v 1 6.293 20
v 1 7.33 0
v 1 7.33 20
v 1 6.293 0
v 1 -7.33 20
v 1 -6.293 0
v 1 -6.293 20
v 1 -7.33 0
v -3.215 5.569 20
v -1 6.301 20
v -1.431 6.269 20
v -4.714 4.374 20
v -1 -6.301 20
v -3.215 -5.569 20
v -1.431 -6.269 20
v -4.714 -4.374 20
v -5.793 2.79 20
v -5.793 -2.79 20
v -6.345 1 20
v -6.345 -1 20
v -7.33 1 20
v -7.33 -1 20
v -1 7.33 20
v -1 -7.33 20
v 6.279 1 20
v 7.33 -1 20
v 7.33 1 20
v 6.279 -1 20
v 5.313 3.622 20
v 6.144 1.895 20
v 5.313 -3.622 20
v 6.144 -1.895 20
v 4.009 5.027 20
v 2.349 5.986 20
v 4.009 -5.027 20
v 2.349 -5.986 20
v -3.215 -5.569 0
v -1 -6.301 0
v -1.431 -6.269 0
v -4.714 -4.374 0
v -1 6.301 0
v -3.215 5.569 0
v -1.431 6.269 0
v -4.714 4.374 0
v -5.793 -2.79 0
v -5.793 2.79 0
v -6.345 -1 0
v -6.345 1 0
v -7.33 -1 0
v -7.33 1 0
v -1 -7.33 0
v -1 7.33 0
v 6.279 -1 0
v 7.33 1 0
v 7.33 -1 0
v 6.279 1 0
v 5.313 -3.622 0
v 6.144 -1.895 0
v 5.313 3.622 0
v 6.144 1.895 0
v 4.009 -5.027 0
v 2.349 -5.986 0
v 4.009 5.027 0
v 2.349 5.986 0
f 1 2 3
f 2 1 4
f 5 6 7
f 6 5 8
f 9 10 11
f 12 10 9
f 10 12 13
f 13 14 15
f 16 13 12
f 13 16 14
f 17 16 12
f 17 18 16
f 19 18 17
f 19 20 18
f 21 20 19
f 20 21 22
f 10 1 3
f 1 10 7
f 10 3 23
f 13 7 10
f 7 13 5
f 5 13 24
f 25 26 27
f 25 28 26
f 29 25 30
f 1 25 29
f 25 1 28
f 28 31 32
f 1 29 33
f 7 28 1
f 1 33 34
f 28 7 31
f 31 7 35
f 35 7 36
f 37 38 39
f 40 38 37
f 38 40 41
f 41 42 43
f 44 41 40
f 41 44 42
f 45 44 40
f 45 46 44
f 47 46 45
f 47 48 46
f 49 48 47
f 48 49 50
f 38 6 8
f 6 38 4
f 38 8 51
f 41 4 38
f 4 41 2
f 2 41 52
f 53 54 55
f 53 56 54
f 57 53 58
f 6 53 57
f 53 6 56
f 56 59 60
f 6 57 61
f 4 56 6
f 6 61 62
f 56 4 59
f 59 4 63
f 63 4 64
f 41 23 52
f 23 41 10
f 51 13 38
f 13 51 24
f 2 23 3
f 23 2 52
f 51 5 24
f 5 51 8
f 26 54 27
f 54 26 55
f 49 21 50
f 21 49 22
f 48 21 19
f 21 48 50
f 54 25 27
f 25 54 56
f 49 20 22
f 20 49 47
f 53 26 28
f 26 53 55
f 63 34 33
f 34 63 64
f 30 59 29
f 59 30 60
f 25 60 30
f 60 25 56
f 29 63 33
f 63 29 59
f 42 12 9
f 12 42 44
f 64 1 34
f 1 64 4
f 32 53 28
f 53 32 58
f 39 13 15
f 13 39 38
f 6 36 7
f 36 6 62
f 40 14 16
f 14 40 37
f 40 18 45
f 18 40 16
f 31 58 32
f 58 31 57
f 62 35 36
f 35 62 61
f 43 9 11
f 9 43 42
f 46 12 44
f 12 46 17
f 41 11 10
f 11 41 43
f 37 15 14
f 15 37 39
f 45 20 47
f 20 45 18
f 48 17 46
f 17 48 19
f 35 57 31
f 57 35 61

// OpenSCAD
// New Connector 

// 26 px ~ 0.5mm
// Tooth Length 135.5 px ~ 2.6mm

/* 
Sanity check: 2.6mm * 16 =  41.6mm.

"ID": {13.38, 13.45, 13.51} ~ 42.24 mm circumference.
*/

r = 12.86/2;
r2 = 14.66/2;
L = 20;
cylinder(h = L, r= r, center=false);

w=2;
union() {
color("blue") {
translate([-w/2,-r2,0]) {
cube([w, 2*r2, L]);
}
}
color("green") {
translate([-r2,-w/2,0]) {
cube([2*r2, w, L]);
}
}
}

/*
rotate([0, 0, 45]) {
union() {
color("blue") {
translate([-w/2,-r2,0]) {
cube([w, 2*r2, L]);
}
}
color("green") {
translate([-r2,-w/2,0]) {
cube([2*r2, w, L]);
}
}
}
}
*/
